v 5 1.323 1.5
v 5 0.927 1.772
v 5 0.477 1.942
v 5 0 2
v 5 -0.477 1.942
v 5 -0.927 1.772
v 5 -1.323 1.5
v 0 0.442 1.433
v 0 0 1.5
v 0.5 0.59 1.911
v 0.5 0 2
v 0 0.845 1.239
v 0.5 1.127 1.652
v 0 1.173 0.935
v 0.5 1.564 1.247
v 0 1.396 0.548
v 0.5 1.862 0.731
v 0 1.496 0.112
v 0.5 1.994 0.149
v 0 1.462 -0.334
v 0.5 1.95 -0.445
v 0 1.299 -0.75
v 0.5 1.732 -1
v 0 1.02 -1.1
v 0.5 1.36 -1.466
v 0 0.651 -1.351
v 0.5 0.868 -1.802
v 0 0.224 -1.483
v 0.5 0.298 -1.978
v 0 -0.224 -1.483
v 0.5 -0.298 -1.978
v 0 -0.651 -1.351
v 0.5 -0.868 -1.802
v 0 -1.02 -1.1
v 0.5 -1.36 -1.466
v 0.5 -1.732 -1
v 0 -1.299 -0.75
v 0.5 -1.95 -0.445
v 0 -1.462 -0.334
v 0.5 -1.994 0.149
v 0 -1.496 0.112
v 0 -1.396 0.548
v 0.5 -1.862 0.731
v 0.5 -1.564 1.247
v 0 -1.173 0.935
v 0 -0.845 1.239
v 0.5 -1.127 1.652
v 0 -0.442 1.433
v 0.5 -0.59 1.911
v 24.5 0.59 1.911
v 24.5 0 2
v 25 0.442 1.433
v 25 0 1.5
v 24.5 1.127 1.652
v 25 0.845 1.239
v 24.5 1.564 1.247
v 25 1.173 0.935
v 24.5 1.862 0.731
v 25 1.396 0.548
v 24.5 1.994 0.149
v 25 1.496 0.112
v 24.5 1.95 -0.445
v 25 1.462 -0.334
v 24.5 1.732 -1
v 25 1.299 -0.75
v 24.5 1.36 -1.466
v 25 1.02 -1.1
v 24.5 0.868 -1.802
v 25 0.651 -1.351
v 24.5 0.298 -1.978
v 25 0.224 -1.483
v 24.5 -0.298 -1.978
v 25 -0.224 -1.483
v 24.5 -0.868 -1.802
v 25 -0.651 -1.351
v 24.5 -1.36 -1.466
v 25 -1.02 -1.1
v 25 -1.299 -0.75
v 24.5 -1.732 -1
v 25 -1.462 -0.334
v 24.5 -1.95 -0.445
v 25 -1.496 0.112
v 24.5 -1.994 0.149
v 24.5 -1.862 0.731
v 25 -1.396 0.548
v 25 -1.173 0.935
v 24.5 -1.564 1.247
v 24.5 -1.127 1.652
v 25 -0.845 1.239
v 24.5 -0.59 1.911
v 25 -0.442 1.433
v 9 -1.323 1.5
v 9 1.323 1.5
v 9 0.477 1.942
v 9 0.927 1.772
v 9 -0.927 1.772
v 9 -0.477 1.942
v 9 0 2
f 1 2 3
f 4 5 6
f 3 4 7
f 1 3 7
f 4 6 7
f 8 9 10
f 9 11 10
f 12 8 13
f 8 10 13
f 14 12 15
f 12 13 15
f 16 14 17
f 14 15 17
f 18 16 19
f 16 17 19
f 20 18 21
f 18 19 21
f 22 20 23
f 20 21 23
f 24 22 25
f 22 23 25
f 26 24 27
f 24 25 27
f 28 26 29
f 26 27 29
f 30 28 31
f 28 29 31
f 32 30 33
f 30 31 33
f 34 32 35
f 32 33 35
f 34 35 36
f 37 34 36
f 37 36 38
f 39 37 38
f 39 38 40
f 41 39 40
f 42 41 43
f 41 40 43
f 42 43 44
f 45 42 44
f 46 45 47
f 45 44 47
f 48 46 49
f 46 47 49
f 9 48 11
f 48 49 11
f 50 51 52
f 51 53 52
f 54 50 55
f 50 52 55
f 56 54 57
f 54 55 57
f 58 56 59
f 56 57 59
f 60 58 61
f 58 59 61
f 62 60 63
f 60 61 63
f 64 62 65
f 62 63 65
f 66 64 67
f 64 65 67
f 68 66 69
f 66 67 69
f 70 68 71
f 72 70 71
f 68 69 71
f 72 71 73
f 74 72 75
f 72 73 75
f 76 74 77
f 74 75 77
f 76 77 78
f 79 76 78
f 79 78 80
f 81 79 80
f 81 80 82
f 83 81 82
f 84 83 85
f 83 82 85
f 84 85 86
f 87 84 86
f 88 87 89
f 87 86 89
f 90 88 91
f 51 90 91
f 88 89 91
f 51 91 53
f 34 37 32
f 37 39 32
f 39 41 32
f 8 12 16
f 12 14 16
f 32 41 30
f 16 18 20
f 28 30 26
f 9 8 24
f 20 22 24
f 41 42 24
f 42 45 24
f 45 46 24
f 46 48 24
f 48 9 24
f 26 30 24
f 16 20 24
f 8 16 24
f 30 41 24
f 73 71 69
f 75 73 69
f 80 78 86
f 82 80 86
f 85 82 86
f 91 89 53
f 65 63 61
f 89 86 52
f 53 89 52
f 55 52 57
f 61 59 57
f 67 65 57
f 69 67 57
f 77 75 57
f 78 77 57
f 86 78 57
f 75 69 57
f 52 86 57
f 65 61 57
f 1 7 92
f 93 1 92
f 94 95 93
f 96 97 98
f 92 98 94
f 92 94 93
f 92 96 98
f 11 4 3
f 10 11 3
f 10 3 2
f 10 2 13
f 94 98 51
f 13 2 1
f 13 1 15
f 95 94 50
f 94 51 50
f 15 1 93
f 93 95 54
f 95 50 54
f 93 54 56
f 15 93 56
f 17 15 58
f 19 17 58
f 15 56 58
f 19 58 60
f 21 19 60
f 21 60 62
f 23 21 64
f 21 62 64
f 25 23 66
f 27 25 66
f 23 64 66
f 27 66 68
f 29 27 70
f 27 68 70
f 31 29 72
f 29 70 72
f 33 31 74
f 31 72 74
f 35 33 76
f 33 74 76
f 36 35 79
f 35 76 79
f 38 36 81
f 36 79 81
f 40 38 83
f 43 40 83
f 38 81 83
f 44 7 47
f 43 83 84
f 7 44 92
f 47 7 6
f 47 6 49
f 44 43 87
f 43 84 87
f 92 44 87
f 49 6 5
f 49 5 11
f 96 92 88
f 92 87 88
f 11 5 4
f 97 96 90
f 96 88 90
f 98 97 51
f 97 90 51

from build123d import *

# Parameters (mm, degrees)
ENL_V_MAT_EXTRU_1_DEPTH      = 4
ENL_V_MAT_EXTRU_1_DEPTH_BACK = 4
ESQUISSE2_W                  = 4
ESQUISSE2_H                  = 0.5


with BuildPart() as part:
    # Esquisse1 → Révolution1 (revolve)
    with BuildSketch(Plane.XY):
        Polygon((0, 0), (0, 1.5), (0.5, 2), (24.5, 2), (25, 1.5), (25, 0), align=None)
    revolve(axis=Axis((25, 0, 0), (-1, 0, 0)))

    # Esquisse2 → Enlèv. mat.-Extru.1 (cut, two sides: drawn at the far end of the back side and taken through both)
    with BuildSketch(Plane(origin=(0, 0, 0), x_dir=(1, 0, 0), z_dir=(0, 1, 0)).offset(-ENL_V_MAT_EXTRU_1_DEPTH_BACK)):
        with Locations((7, -1.75)):
            Rectangle(ESQUISSE2_W, ESQUISSE2_H)
    extrude(amount=ENL_V_MAT_EXTRU_1_DEPTH + ENL_V_MAT_EXTRU_1_DEPTH_BACK, mode=Mode.SUBTRACT)


solid = part.part
